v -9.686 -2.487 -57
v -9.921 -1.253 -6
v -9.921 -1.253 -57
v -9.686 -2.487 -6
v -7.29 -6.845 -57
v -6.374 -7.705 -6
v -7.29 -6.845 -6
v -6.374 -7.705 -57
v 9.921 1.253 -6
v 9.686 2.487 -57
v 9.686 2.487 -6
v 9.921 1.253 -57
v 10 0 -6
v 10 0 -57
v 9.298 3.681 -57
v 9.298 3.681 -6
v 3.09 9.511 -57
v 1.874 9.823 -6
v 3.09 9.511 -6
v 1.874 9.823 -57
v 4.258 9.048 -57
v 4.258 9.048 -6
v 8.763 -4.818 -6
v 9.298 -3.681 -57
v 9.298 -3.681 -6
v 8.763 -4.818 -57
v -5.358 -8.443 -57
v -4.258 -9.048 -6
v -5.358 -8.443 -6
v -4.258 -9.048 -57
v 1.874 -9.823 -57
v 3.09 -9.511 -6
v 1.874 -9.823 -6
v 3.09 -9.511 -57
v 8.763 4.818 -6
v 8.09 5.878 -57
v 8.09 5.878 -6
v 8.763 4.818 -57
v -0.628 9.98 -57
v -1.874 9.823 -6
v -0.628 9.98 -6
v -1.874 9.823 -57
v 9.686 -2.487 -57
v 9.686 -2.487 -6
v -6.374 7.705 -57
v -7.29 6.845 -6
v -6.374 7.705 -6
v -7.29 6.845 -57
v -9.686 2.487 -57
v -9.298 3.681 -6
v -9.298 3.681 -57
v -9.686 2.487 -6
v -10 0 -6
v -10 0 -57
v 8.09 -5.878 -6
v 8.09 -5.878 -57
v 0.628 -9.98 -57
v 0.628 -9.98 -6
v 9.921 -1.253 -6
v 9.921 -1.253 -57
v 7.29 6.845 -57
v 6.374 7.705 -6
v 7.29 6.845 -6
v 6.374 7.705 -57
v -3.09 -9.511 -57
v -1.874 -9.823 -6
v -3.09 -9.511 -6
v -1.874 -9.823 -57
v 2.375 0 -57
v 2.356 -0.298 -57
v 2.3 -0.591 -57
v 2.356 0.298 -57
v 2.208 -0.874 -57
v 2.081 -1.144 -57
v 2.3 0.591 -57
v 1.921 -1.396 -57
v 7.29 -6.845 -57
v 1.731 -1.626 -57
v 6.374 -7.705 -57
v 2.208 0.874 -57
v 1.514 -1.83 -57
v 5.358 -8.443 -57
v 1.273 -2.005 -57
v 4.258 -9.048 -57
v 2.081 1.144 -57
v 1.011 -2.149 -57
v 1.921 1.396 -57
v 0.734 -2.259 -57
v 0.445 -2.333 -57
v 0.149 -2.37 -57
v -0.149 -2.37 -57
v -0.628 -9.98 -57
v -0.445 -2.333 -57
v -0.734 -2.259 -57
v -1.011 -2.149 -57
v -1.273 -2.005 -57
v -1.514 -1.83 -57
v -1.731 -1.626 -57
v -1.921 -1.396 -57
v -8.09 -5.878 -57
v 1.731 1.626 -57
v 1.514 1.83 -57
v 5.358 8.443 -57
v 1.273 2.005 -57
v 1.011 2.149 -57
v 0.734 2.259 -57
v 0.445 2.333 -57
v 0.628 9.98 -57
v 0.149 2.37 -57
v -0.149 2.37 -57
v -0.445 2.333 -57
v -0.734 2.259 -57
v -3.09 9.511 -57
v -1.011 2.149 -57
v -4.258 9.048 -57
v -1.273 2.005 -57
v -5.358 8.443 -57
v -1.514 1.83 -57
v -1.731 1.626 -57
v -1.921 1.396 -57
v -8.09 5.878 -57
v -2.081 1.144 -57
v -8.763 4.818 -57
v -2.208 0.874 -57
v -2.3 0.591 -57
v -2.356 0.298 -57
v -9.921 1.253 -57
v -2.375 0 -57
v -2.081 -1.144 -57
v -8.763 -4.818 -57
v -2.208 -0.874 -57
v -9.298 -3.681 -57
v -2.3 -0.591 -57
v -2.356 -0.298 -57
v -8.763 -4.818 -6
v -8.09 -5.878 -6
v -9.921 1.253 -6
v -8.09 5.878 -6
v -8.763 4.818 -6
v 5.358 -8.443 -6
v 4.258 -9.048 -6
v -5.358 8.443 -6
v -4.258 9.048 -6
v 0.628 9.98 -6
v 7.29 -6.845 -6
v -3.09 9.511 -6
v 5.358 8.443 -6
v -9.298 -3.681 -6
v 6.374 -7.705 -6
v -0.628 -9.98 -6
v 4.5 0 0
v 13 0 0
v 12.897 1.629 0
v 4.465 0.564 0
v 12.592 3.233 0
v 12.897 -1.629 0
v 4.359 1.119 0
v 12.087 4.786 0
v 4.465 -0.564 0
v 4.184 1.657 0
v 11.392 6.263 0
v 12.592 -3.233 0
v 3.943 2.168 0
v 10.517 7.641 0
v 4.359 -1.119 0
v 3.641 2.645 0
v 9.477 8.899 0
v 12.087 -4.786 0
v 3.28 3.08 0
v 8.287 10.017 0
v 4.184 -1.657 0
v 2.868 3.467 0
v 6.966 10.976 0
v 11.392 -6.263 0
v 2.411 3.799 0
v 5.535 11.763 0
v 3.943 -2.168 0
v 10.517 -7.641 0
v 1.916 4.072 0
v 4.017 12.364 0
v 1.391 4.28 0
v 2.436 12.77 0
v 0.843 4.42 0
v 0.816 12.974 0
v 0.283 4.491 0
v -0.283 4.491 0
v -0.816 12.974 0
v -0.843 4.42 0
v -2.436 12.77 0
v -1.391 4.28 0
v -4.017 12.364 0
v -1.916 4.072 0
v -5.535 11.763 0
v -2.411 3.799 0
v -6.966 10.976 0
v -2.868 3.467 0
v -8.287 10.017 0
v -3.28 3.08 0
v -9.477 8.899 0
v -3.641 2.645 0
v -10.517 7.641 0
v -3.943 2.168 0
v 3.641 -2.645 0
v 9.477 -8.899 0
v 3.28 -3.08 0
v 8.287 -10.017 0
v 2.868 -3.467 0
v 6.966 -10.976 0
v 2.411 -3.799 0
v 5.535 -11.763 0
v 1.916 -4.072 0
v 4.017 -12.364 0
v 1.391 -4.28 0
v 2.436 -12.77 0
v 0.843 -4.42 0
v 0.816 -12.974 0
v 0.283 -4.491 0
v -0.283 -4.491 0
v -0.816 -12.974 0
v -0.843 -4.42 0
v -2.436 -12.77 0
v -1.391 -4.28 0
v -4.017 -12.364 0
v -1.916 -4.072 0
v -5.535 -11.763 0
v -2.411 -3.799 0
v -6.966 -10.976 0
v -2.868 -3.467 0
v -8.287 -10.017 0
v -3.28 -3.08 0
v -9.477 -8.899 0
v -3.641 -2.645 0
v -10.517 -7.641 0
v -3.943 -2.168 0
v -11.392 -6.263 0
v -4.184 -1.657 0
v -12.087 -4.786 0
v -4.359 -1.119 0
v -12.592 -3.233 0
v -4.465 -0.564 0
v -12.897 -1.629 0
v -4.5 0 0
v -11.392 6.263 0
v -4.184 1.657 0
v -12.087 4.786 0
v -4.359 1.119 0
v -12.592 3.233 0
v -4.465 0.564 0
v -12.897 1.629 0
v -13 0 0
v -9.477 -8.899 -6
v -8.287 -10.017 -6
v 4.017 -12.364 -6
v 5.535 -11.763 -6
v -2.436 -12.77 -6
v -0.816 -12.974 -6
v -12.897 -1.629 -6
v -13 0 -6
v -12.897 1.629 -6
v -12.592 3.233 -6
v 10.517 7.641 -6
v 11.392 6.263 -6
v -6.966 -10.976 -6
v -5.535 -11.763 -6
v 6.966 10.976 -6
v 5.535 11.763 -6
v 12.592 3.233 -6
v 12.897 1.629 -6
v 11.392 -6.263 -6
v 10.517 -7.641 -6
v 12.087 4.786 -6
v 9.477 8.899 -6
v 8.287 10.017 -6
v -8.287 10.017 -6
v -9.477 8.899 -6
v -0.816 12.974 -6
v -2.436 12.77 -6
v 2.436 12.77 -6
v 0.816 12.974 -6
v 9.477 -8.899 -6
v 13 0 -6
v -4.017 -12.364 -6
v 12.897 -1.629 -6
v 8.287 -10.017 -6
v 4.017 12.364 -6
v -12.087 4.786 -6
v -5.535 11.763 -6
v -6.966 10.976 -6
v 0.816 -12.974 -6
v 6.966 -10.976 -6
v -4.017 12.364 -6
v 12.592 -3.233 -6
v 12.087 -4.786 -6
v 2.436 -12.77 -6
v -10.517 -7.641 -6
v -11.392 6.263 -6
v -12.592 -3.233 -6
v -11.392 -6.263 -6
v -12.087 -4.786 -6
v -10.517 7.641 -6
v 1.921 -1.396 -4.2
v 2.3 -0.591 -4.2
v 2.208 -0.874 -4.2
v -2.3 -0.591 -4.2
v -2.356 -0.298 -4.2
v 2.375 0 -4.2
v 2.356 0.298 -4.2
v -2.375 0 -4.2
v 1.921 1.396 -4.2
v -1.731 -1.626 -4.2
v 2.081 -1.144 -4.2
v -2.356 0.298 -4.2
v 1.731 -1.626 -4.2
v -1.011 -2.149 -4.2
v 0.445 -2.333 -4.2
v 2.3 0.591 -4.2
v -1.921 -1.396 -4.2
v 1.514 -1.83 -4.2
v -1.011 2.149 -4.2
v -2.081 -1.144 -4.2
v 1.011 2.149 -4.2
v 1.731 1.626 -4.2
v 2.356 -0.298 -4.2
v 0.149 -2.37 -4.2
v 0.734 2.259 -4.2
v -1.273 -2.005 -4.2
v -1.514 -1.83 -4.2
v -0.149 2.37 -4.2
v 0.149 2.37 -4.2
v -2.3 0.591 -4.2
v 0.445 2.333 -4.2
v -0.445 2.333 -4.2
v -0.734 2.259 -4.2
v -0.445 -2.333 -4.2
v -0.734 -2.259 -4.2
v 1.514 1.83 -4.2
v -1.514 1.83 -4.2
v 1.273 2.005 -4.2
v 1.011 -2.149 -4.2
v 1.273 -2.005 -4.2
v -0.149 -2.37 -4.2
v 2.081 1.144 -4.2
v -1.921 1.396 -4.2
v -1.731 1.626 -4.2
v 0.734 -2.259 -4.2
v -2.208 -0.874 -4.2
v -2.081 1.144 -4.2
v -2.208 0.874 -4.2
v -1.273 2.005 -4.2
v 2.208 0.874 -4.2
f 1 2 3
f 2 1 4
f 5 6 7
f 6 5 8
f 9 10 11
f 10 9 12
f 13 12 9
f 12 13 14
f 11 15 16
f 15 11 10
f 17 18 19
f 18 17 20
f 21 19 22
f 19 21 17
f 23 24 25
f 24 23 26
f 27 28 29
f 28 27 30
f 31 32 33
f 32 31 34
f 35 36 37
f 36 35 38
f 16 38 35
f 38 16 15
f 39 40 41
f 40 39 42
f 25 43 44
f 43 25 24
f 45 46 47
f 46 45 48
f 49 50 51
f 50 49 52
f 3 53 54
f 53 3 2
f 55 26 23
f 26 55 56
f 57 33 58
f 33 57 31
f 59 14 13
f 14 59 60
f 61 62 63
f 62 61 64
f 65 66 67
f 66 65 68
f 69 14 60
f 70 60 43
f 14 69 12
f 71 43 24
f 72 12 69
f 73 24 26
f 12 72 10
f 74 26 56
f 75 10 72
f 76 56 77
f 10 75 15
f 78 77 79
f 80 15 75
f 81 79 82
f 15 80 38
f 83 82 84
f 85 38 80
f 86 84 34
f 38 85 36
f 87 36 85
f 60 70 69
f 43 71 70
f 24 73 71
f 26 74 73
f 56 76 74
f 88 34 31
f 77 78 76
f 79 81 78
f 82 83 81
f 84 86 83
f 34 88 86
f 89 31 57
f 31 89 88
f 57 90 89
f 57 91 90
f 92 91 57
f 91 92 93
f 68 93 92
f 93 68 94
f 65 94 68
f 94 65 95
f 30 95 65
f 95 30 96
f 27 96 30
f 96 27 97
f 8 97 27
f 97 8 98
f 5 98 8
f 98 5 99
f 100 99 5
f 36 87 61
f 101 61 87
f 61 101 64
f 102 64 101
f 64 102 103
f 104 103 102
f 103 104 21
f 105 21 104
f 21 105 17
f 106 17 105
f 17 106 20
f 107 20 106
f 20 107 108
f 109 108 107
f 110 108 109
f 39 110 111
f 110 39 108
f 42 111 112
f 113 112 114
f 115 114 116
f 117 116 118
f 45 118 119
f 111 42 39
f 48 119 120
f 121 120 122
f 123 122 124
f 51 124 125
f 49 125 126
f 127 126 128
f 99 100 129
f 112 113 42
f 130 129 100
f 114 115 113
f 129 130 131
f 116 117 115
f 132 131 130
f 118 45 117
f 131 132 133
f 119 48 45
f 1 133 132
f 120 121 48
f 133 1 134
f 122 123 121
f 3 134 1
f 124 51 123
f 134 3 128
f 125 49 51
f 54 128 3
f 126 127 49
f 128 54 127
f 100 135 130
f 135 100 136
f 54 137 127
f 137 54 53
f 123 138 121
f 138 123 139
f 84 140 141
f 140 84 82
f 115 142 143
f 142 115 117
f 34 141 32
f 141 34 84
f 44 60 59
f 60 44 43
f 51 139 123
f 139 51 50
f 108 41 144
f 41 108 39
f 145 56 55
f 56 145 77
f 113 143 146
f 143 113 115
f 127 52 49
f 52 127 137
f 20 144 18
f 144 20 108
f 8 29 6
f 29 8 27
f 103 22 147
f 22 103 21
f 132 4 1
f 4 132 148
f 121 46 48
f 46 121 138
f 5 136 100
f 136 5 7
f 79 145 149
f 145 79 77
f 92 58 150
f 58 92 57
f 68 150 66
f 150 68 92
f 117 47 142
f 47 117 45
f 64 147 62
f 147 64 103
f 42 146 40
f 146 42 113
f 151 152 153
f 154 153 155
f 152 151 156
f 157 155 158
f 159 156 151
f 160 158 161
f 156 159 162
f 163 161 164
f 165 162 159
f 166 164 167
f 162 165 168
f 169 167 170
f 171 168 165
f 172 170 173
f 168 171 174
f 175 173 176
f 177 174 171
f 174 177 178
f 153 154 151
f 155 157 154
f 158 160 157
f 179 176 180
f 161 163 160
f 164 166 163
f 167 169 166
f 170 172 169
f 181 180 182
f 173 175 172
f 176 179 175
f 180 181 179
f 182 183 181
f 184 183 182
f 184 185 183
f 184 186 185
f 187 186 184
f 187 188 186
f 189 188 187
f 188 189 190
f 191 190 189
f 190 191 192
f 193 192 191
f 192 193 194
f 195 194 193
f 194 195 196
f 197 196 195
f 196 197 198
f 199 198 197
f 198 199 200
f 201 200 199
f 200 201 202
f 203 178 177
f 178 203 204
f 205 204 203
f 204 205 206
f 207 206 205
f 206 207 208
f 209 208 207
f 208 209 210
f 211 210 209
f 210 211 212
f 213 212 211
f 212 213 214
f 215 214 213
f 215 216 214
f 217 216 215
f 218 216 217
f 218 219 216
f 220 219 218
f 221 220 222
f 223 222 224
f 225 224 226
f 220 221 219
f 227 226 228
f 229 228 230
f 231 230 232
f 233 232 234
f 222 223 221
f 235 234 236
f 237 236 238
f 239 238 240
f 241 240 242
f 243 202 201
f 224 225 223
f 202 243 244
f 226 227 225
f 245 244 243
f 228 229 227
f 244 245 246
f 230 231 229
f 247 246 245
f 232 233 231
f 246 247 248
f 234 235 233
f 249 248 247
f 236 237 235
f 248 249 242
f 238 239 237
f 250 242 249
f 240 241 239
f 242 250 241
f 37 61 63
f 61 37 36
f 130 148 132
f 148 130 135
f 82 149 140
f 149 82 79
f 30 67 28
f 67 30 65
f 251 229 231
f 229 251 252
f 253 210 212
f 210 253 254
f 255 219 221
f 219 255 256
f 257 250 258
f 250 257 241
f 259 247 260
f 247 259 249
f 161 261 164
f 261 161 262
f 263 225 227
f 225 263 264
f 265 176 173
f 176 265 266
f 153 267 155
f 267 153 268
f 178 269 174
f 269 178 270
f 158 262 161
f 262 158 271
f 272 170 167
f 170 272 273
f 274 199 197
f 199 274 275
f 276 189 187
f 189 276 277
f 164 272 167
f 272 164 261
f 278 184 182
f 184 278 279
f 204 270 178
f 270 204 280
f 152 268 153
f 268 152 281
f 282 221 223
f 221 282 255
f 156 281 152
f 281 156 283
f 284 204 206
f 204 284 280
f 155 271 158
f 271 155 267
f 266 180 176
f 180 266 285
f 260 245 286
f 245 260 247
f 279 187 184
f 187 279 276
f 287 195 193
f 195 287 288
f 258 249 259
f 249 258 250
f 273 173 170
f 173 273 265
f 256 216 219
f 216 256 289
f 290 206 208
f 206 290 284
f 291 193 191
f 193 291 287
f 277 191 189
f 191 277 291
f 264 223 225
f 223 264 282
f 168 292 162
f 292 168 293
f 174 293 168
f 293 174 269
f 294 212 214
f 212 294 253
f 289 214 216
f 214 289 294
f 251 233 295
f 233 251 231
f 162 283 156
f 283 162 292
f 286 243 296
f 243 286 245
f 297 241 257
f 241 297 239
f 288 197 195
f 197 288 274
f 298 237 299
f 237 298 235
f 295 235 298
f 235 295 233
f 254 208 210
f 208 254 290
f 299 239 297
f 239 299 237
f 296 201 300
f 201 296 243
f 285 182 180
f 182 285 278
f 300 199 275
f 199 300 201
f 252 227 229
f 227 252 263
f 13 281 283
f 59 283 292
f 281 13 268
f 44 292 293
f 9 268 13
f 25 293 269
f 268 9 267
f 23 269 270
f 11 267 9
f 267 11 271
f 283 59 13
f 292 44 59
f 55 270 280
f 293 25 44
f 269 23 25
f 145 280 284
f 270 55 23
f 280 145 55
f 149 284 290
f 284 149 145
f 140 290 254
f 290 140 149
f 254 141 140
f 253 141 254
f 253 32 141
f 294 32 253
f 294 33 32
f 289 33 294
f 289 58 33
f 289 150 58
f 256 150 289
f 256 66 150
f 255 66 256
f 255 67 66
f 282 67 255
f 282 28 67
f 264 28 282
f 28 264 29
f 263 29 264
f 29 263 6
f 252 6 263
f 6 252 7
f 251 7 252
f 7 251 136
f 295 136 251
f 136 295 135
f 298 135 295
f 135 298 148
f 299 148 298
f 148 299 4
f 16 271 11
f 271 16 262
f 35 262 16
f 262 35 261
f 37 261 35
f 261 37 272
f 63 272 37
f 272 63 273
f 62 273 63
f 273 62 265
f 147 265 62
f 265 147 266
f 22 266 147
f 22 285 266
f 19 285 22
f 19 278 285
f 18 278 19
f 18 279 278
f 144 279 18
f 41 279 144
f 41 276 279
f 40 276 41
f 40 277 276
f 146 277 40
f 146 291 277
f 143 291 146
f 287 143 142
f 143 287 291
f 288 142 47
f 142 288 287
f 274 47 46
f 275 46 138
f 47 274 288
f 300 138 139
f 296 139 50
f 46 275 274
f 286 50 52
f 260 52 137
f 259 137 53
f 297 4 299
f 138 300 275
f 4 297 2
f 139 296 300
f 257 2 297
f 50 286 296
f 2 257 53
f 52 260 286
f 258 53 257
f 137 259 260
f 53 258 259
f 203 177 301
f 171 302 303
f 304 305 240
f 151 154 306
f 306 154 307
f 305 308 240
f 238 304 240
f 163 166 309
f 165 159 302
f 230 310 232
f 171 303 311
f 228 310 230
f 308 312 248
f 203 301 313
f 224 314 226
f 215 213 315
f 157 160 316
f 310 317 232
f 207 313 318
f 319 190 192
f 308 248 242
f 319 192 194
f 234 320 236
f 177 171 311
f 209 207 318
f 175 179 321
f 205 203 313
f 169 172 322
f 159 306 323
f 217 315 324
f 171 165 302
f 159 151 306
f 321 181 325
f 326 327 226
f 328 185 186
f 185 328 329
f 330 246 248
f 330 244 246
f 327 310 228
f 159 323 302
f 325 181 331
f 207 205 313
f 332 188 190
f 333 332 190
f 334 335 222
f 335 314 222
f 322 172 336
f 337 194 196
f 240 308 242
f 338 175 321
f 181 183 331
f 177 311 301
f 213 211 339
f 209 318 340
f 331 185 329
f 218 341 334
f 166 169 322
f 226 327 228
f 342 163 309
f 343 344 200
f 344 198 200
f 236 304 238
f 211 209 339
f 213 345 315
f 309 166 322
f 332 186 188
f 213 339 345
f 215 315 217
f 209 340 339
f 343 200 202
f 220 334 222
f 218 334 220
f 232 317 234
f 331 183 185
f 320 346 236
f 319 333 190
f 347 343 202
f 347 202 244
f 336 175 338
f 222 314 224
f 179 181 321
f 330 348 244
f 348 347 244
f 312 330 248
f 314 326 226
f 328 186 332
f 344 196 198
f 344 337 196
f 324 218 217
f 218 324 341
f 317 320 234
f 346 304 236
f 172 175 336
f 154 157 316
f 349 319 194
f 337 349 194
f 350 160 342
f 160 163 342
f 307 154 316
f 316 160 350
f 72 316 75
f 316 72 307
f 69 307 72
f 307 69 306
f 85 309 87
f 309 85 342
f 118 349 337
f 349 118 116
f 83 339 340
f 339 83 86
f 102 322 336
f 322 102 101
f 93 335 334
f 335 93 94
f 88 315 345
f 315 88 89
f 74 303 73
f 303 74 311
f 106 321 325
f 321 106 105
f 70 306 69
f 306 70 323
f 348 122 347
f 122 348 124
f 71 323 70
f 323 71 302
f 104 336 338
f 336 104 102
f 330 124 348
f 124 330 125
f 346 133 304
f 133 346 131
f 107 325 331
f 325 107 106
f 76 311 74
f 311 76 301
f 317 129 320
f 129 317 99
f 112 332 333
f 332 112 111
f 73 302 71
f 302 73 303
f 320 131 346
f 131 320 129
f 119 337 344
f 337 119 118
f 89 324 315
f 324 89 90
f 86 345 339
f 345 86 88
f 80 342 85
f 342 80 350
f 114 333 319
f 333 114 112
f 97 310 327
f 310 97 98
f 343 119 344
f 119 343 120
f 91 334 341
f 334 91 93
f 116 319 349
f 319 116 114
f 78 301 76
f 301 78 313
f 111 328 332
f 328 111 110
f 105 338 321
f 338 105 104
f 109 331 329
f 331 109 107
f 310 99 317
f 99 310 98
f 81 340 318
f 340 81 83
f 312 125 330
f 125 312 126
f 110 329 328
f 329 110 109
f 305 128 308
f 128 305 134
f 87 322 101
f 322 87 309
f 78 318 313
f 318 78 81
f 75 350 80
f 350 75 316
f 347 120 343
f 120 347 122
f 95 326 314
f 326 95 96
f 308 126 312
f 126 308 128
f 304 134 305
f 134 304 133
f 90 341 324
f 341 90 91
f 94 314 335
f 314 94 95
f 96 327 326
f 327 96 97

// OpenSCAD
$fn = 50;


difference() {
	union() {
		translate(v = [0, 0, -57.0000000000]) {
			cylinder(h = 57, r = 10.0000000000);
		}
		translate(v = [0, 0, -6.0000000000]) {
			cylinder(h = 6, r = 13.0000000000);
		}
	}
	union() {
		translate(v = [0, 0, 0]) {
			rotate(a = [0, 0, 0]) {
				difference() {
					union() {
						#translate(v = [0, 0, -57.0000000000]) {
							cylinder(h = 57, r = 2.2500000000);
						}
						#translate(v = [0, 0, -4.2000000000]) {
							cylinder(h = 4.2000000000, r1 = 2.3750000000, r2 = 4.5000000000);
						}
						#translate(v = [0, 0, -57.0000000000]) {
							cylinder(h = 57, r = 2.3750000000);
						}
						#translate(v = [0, 0, -57.0000000000]) {
							cylinder(h = 57, r = 2.2500000000);
						}
					}
					union();
				}
			}
		}
	}
}
